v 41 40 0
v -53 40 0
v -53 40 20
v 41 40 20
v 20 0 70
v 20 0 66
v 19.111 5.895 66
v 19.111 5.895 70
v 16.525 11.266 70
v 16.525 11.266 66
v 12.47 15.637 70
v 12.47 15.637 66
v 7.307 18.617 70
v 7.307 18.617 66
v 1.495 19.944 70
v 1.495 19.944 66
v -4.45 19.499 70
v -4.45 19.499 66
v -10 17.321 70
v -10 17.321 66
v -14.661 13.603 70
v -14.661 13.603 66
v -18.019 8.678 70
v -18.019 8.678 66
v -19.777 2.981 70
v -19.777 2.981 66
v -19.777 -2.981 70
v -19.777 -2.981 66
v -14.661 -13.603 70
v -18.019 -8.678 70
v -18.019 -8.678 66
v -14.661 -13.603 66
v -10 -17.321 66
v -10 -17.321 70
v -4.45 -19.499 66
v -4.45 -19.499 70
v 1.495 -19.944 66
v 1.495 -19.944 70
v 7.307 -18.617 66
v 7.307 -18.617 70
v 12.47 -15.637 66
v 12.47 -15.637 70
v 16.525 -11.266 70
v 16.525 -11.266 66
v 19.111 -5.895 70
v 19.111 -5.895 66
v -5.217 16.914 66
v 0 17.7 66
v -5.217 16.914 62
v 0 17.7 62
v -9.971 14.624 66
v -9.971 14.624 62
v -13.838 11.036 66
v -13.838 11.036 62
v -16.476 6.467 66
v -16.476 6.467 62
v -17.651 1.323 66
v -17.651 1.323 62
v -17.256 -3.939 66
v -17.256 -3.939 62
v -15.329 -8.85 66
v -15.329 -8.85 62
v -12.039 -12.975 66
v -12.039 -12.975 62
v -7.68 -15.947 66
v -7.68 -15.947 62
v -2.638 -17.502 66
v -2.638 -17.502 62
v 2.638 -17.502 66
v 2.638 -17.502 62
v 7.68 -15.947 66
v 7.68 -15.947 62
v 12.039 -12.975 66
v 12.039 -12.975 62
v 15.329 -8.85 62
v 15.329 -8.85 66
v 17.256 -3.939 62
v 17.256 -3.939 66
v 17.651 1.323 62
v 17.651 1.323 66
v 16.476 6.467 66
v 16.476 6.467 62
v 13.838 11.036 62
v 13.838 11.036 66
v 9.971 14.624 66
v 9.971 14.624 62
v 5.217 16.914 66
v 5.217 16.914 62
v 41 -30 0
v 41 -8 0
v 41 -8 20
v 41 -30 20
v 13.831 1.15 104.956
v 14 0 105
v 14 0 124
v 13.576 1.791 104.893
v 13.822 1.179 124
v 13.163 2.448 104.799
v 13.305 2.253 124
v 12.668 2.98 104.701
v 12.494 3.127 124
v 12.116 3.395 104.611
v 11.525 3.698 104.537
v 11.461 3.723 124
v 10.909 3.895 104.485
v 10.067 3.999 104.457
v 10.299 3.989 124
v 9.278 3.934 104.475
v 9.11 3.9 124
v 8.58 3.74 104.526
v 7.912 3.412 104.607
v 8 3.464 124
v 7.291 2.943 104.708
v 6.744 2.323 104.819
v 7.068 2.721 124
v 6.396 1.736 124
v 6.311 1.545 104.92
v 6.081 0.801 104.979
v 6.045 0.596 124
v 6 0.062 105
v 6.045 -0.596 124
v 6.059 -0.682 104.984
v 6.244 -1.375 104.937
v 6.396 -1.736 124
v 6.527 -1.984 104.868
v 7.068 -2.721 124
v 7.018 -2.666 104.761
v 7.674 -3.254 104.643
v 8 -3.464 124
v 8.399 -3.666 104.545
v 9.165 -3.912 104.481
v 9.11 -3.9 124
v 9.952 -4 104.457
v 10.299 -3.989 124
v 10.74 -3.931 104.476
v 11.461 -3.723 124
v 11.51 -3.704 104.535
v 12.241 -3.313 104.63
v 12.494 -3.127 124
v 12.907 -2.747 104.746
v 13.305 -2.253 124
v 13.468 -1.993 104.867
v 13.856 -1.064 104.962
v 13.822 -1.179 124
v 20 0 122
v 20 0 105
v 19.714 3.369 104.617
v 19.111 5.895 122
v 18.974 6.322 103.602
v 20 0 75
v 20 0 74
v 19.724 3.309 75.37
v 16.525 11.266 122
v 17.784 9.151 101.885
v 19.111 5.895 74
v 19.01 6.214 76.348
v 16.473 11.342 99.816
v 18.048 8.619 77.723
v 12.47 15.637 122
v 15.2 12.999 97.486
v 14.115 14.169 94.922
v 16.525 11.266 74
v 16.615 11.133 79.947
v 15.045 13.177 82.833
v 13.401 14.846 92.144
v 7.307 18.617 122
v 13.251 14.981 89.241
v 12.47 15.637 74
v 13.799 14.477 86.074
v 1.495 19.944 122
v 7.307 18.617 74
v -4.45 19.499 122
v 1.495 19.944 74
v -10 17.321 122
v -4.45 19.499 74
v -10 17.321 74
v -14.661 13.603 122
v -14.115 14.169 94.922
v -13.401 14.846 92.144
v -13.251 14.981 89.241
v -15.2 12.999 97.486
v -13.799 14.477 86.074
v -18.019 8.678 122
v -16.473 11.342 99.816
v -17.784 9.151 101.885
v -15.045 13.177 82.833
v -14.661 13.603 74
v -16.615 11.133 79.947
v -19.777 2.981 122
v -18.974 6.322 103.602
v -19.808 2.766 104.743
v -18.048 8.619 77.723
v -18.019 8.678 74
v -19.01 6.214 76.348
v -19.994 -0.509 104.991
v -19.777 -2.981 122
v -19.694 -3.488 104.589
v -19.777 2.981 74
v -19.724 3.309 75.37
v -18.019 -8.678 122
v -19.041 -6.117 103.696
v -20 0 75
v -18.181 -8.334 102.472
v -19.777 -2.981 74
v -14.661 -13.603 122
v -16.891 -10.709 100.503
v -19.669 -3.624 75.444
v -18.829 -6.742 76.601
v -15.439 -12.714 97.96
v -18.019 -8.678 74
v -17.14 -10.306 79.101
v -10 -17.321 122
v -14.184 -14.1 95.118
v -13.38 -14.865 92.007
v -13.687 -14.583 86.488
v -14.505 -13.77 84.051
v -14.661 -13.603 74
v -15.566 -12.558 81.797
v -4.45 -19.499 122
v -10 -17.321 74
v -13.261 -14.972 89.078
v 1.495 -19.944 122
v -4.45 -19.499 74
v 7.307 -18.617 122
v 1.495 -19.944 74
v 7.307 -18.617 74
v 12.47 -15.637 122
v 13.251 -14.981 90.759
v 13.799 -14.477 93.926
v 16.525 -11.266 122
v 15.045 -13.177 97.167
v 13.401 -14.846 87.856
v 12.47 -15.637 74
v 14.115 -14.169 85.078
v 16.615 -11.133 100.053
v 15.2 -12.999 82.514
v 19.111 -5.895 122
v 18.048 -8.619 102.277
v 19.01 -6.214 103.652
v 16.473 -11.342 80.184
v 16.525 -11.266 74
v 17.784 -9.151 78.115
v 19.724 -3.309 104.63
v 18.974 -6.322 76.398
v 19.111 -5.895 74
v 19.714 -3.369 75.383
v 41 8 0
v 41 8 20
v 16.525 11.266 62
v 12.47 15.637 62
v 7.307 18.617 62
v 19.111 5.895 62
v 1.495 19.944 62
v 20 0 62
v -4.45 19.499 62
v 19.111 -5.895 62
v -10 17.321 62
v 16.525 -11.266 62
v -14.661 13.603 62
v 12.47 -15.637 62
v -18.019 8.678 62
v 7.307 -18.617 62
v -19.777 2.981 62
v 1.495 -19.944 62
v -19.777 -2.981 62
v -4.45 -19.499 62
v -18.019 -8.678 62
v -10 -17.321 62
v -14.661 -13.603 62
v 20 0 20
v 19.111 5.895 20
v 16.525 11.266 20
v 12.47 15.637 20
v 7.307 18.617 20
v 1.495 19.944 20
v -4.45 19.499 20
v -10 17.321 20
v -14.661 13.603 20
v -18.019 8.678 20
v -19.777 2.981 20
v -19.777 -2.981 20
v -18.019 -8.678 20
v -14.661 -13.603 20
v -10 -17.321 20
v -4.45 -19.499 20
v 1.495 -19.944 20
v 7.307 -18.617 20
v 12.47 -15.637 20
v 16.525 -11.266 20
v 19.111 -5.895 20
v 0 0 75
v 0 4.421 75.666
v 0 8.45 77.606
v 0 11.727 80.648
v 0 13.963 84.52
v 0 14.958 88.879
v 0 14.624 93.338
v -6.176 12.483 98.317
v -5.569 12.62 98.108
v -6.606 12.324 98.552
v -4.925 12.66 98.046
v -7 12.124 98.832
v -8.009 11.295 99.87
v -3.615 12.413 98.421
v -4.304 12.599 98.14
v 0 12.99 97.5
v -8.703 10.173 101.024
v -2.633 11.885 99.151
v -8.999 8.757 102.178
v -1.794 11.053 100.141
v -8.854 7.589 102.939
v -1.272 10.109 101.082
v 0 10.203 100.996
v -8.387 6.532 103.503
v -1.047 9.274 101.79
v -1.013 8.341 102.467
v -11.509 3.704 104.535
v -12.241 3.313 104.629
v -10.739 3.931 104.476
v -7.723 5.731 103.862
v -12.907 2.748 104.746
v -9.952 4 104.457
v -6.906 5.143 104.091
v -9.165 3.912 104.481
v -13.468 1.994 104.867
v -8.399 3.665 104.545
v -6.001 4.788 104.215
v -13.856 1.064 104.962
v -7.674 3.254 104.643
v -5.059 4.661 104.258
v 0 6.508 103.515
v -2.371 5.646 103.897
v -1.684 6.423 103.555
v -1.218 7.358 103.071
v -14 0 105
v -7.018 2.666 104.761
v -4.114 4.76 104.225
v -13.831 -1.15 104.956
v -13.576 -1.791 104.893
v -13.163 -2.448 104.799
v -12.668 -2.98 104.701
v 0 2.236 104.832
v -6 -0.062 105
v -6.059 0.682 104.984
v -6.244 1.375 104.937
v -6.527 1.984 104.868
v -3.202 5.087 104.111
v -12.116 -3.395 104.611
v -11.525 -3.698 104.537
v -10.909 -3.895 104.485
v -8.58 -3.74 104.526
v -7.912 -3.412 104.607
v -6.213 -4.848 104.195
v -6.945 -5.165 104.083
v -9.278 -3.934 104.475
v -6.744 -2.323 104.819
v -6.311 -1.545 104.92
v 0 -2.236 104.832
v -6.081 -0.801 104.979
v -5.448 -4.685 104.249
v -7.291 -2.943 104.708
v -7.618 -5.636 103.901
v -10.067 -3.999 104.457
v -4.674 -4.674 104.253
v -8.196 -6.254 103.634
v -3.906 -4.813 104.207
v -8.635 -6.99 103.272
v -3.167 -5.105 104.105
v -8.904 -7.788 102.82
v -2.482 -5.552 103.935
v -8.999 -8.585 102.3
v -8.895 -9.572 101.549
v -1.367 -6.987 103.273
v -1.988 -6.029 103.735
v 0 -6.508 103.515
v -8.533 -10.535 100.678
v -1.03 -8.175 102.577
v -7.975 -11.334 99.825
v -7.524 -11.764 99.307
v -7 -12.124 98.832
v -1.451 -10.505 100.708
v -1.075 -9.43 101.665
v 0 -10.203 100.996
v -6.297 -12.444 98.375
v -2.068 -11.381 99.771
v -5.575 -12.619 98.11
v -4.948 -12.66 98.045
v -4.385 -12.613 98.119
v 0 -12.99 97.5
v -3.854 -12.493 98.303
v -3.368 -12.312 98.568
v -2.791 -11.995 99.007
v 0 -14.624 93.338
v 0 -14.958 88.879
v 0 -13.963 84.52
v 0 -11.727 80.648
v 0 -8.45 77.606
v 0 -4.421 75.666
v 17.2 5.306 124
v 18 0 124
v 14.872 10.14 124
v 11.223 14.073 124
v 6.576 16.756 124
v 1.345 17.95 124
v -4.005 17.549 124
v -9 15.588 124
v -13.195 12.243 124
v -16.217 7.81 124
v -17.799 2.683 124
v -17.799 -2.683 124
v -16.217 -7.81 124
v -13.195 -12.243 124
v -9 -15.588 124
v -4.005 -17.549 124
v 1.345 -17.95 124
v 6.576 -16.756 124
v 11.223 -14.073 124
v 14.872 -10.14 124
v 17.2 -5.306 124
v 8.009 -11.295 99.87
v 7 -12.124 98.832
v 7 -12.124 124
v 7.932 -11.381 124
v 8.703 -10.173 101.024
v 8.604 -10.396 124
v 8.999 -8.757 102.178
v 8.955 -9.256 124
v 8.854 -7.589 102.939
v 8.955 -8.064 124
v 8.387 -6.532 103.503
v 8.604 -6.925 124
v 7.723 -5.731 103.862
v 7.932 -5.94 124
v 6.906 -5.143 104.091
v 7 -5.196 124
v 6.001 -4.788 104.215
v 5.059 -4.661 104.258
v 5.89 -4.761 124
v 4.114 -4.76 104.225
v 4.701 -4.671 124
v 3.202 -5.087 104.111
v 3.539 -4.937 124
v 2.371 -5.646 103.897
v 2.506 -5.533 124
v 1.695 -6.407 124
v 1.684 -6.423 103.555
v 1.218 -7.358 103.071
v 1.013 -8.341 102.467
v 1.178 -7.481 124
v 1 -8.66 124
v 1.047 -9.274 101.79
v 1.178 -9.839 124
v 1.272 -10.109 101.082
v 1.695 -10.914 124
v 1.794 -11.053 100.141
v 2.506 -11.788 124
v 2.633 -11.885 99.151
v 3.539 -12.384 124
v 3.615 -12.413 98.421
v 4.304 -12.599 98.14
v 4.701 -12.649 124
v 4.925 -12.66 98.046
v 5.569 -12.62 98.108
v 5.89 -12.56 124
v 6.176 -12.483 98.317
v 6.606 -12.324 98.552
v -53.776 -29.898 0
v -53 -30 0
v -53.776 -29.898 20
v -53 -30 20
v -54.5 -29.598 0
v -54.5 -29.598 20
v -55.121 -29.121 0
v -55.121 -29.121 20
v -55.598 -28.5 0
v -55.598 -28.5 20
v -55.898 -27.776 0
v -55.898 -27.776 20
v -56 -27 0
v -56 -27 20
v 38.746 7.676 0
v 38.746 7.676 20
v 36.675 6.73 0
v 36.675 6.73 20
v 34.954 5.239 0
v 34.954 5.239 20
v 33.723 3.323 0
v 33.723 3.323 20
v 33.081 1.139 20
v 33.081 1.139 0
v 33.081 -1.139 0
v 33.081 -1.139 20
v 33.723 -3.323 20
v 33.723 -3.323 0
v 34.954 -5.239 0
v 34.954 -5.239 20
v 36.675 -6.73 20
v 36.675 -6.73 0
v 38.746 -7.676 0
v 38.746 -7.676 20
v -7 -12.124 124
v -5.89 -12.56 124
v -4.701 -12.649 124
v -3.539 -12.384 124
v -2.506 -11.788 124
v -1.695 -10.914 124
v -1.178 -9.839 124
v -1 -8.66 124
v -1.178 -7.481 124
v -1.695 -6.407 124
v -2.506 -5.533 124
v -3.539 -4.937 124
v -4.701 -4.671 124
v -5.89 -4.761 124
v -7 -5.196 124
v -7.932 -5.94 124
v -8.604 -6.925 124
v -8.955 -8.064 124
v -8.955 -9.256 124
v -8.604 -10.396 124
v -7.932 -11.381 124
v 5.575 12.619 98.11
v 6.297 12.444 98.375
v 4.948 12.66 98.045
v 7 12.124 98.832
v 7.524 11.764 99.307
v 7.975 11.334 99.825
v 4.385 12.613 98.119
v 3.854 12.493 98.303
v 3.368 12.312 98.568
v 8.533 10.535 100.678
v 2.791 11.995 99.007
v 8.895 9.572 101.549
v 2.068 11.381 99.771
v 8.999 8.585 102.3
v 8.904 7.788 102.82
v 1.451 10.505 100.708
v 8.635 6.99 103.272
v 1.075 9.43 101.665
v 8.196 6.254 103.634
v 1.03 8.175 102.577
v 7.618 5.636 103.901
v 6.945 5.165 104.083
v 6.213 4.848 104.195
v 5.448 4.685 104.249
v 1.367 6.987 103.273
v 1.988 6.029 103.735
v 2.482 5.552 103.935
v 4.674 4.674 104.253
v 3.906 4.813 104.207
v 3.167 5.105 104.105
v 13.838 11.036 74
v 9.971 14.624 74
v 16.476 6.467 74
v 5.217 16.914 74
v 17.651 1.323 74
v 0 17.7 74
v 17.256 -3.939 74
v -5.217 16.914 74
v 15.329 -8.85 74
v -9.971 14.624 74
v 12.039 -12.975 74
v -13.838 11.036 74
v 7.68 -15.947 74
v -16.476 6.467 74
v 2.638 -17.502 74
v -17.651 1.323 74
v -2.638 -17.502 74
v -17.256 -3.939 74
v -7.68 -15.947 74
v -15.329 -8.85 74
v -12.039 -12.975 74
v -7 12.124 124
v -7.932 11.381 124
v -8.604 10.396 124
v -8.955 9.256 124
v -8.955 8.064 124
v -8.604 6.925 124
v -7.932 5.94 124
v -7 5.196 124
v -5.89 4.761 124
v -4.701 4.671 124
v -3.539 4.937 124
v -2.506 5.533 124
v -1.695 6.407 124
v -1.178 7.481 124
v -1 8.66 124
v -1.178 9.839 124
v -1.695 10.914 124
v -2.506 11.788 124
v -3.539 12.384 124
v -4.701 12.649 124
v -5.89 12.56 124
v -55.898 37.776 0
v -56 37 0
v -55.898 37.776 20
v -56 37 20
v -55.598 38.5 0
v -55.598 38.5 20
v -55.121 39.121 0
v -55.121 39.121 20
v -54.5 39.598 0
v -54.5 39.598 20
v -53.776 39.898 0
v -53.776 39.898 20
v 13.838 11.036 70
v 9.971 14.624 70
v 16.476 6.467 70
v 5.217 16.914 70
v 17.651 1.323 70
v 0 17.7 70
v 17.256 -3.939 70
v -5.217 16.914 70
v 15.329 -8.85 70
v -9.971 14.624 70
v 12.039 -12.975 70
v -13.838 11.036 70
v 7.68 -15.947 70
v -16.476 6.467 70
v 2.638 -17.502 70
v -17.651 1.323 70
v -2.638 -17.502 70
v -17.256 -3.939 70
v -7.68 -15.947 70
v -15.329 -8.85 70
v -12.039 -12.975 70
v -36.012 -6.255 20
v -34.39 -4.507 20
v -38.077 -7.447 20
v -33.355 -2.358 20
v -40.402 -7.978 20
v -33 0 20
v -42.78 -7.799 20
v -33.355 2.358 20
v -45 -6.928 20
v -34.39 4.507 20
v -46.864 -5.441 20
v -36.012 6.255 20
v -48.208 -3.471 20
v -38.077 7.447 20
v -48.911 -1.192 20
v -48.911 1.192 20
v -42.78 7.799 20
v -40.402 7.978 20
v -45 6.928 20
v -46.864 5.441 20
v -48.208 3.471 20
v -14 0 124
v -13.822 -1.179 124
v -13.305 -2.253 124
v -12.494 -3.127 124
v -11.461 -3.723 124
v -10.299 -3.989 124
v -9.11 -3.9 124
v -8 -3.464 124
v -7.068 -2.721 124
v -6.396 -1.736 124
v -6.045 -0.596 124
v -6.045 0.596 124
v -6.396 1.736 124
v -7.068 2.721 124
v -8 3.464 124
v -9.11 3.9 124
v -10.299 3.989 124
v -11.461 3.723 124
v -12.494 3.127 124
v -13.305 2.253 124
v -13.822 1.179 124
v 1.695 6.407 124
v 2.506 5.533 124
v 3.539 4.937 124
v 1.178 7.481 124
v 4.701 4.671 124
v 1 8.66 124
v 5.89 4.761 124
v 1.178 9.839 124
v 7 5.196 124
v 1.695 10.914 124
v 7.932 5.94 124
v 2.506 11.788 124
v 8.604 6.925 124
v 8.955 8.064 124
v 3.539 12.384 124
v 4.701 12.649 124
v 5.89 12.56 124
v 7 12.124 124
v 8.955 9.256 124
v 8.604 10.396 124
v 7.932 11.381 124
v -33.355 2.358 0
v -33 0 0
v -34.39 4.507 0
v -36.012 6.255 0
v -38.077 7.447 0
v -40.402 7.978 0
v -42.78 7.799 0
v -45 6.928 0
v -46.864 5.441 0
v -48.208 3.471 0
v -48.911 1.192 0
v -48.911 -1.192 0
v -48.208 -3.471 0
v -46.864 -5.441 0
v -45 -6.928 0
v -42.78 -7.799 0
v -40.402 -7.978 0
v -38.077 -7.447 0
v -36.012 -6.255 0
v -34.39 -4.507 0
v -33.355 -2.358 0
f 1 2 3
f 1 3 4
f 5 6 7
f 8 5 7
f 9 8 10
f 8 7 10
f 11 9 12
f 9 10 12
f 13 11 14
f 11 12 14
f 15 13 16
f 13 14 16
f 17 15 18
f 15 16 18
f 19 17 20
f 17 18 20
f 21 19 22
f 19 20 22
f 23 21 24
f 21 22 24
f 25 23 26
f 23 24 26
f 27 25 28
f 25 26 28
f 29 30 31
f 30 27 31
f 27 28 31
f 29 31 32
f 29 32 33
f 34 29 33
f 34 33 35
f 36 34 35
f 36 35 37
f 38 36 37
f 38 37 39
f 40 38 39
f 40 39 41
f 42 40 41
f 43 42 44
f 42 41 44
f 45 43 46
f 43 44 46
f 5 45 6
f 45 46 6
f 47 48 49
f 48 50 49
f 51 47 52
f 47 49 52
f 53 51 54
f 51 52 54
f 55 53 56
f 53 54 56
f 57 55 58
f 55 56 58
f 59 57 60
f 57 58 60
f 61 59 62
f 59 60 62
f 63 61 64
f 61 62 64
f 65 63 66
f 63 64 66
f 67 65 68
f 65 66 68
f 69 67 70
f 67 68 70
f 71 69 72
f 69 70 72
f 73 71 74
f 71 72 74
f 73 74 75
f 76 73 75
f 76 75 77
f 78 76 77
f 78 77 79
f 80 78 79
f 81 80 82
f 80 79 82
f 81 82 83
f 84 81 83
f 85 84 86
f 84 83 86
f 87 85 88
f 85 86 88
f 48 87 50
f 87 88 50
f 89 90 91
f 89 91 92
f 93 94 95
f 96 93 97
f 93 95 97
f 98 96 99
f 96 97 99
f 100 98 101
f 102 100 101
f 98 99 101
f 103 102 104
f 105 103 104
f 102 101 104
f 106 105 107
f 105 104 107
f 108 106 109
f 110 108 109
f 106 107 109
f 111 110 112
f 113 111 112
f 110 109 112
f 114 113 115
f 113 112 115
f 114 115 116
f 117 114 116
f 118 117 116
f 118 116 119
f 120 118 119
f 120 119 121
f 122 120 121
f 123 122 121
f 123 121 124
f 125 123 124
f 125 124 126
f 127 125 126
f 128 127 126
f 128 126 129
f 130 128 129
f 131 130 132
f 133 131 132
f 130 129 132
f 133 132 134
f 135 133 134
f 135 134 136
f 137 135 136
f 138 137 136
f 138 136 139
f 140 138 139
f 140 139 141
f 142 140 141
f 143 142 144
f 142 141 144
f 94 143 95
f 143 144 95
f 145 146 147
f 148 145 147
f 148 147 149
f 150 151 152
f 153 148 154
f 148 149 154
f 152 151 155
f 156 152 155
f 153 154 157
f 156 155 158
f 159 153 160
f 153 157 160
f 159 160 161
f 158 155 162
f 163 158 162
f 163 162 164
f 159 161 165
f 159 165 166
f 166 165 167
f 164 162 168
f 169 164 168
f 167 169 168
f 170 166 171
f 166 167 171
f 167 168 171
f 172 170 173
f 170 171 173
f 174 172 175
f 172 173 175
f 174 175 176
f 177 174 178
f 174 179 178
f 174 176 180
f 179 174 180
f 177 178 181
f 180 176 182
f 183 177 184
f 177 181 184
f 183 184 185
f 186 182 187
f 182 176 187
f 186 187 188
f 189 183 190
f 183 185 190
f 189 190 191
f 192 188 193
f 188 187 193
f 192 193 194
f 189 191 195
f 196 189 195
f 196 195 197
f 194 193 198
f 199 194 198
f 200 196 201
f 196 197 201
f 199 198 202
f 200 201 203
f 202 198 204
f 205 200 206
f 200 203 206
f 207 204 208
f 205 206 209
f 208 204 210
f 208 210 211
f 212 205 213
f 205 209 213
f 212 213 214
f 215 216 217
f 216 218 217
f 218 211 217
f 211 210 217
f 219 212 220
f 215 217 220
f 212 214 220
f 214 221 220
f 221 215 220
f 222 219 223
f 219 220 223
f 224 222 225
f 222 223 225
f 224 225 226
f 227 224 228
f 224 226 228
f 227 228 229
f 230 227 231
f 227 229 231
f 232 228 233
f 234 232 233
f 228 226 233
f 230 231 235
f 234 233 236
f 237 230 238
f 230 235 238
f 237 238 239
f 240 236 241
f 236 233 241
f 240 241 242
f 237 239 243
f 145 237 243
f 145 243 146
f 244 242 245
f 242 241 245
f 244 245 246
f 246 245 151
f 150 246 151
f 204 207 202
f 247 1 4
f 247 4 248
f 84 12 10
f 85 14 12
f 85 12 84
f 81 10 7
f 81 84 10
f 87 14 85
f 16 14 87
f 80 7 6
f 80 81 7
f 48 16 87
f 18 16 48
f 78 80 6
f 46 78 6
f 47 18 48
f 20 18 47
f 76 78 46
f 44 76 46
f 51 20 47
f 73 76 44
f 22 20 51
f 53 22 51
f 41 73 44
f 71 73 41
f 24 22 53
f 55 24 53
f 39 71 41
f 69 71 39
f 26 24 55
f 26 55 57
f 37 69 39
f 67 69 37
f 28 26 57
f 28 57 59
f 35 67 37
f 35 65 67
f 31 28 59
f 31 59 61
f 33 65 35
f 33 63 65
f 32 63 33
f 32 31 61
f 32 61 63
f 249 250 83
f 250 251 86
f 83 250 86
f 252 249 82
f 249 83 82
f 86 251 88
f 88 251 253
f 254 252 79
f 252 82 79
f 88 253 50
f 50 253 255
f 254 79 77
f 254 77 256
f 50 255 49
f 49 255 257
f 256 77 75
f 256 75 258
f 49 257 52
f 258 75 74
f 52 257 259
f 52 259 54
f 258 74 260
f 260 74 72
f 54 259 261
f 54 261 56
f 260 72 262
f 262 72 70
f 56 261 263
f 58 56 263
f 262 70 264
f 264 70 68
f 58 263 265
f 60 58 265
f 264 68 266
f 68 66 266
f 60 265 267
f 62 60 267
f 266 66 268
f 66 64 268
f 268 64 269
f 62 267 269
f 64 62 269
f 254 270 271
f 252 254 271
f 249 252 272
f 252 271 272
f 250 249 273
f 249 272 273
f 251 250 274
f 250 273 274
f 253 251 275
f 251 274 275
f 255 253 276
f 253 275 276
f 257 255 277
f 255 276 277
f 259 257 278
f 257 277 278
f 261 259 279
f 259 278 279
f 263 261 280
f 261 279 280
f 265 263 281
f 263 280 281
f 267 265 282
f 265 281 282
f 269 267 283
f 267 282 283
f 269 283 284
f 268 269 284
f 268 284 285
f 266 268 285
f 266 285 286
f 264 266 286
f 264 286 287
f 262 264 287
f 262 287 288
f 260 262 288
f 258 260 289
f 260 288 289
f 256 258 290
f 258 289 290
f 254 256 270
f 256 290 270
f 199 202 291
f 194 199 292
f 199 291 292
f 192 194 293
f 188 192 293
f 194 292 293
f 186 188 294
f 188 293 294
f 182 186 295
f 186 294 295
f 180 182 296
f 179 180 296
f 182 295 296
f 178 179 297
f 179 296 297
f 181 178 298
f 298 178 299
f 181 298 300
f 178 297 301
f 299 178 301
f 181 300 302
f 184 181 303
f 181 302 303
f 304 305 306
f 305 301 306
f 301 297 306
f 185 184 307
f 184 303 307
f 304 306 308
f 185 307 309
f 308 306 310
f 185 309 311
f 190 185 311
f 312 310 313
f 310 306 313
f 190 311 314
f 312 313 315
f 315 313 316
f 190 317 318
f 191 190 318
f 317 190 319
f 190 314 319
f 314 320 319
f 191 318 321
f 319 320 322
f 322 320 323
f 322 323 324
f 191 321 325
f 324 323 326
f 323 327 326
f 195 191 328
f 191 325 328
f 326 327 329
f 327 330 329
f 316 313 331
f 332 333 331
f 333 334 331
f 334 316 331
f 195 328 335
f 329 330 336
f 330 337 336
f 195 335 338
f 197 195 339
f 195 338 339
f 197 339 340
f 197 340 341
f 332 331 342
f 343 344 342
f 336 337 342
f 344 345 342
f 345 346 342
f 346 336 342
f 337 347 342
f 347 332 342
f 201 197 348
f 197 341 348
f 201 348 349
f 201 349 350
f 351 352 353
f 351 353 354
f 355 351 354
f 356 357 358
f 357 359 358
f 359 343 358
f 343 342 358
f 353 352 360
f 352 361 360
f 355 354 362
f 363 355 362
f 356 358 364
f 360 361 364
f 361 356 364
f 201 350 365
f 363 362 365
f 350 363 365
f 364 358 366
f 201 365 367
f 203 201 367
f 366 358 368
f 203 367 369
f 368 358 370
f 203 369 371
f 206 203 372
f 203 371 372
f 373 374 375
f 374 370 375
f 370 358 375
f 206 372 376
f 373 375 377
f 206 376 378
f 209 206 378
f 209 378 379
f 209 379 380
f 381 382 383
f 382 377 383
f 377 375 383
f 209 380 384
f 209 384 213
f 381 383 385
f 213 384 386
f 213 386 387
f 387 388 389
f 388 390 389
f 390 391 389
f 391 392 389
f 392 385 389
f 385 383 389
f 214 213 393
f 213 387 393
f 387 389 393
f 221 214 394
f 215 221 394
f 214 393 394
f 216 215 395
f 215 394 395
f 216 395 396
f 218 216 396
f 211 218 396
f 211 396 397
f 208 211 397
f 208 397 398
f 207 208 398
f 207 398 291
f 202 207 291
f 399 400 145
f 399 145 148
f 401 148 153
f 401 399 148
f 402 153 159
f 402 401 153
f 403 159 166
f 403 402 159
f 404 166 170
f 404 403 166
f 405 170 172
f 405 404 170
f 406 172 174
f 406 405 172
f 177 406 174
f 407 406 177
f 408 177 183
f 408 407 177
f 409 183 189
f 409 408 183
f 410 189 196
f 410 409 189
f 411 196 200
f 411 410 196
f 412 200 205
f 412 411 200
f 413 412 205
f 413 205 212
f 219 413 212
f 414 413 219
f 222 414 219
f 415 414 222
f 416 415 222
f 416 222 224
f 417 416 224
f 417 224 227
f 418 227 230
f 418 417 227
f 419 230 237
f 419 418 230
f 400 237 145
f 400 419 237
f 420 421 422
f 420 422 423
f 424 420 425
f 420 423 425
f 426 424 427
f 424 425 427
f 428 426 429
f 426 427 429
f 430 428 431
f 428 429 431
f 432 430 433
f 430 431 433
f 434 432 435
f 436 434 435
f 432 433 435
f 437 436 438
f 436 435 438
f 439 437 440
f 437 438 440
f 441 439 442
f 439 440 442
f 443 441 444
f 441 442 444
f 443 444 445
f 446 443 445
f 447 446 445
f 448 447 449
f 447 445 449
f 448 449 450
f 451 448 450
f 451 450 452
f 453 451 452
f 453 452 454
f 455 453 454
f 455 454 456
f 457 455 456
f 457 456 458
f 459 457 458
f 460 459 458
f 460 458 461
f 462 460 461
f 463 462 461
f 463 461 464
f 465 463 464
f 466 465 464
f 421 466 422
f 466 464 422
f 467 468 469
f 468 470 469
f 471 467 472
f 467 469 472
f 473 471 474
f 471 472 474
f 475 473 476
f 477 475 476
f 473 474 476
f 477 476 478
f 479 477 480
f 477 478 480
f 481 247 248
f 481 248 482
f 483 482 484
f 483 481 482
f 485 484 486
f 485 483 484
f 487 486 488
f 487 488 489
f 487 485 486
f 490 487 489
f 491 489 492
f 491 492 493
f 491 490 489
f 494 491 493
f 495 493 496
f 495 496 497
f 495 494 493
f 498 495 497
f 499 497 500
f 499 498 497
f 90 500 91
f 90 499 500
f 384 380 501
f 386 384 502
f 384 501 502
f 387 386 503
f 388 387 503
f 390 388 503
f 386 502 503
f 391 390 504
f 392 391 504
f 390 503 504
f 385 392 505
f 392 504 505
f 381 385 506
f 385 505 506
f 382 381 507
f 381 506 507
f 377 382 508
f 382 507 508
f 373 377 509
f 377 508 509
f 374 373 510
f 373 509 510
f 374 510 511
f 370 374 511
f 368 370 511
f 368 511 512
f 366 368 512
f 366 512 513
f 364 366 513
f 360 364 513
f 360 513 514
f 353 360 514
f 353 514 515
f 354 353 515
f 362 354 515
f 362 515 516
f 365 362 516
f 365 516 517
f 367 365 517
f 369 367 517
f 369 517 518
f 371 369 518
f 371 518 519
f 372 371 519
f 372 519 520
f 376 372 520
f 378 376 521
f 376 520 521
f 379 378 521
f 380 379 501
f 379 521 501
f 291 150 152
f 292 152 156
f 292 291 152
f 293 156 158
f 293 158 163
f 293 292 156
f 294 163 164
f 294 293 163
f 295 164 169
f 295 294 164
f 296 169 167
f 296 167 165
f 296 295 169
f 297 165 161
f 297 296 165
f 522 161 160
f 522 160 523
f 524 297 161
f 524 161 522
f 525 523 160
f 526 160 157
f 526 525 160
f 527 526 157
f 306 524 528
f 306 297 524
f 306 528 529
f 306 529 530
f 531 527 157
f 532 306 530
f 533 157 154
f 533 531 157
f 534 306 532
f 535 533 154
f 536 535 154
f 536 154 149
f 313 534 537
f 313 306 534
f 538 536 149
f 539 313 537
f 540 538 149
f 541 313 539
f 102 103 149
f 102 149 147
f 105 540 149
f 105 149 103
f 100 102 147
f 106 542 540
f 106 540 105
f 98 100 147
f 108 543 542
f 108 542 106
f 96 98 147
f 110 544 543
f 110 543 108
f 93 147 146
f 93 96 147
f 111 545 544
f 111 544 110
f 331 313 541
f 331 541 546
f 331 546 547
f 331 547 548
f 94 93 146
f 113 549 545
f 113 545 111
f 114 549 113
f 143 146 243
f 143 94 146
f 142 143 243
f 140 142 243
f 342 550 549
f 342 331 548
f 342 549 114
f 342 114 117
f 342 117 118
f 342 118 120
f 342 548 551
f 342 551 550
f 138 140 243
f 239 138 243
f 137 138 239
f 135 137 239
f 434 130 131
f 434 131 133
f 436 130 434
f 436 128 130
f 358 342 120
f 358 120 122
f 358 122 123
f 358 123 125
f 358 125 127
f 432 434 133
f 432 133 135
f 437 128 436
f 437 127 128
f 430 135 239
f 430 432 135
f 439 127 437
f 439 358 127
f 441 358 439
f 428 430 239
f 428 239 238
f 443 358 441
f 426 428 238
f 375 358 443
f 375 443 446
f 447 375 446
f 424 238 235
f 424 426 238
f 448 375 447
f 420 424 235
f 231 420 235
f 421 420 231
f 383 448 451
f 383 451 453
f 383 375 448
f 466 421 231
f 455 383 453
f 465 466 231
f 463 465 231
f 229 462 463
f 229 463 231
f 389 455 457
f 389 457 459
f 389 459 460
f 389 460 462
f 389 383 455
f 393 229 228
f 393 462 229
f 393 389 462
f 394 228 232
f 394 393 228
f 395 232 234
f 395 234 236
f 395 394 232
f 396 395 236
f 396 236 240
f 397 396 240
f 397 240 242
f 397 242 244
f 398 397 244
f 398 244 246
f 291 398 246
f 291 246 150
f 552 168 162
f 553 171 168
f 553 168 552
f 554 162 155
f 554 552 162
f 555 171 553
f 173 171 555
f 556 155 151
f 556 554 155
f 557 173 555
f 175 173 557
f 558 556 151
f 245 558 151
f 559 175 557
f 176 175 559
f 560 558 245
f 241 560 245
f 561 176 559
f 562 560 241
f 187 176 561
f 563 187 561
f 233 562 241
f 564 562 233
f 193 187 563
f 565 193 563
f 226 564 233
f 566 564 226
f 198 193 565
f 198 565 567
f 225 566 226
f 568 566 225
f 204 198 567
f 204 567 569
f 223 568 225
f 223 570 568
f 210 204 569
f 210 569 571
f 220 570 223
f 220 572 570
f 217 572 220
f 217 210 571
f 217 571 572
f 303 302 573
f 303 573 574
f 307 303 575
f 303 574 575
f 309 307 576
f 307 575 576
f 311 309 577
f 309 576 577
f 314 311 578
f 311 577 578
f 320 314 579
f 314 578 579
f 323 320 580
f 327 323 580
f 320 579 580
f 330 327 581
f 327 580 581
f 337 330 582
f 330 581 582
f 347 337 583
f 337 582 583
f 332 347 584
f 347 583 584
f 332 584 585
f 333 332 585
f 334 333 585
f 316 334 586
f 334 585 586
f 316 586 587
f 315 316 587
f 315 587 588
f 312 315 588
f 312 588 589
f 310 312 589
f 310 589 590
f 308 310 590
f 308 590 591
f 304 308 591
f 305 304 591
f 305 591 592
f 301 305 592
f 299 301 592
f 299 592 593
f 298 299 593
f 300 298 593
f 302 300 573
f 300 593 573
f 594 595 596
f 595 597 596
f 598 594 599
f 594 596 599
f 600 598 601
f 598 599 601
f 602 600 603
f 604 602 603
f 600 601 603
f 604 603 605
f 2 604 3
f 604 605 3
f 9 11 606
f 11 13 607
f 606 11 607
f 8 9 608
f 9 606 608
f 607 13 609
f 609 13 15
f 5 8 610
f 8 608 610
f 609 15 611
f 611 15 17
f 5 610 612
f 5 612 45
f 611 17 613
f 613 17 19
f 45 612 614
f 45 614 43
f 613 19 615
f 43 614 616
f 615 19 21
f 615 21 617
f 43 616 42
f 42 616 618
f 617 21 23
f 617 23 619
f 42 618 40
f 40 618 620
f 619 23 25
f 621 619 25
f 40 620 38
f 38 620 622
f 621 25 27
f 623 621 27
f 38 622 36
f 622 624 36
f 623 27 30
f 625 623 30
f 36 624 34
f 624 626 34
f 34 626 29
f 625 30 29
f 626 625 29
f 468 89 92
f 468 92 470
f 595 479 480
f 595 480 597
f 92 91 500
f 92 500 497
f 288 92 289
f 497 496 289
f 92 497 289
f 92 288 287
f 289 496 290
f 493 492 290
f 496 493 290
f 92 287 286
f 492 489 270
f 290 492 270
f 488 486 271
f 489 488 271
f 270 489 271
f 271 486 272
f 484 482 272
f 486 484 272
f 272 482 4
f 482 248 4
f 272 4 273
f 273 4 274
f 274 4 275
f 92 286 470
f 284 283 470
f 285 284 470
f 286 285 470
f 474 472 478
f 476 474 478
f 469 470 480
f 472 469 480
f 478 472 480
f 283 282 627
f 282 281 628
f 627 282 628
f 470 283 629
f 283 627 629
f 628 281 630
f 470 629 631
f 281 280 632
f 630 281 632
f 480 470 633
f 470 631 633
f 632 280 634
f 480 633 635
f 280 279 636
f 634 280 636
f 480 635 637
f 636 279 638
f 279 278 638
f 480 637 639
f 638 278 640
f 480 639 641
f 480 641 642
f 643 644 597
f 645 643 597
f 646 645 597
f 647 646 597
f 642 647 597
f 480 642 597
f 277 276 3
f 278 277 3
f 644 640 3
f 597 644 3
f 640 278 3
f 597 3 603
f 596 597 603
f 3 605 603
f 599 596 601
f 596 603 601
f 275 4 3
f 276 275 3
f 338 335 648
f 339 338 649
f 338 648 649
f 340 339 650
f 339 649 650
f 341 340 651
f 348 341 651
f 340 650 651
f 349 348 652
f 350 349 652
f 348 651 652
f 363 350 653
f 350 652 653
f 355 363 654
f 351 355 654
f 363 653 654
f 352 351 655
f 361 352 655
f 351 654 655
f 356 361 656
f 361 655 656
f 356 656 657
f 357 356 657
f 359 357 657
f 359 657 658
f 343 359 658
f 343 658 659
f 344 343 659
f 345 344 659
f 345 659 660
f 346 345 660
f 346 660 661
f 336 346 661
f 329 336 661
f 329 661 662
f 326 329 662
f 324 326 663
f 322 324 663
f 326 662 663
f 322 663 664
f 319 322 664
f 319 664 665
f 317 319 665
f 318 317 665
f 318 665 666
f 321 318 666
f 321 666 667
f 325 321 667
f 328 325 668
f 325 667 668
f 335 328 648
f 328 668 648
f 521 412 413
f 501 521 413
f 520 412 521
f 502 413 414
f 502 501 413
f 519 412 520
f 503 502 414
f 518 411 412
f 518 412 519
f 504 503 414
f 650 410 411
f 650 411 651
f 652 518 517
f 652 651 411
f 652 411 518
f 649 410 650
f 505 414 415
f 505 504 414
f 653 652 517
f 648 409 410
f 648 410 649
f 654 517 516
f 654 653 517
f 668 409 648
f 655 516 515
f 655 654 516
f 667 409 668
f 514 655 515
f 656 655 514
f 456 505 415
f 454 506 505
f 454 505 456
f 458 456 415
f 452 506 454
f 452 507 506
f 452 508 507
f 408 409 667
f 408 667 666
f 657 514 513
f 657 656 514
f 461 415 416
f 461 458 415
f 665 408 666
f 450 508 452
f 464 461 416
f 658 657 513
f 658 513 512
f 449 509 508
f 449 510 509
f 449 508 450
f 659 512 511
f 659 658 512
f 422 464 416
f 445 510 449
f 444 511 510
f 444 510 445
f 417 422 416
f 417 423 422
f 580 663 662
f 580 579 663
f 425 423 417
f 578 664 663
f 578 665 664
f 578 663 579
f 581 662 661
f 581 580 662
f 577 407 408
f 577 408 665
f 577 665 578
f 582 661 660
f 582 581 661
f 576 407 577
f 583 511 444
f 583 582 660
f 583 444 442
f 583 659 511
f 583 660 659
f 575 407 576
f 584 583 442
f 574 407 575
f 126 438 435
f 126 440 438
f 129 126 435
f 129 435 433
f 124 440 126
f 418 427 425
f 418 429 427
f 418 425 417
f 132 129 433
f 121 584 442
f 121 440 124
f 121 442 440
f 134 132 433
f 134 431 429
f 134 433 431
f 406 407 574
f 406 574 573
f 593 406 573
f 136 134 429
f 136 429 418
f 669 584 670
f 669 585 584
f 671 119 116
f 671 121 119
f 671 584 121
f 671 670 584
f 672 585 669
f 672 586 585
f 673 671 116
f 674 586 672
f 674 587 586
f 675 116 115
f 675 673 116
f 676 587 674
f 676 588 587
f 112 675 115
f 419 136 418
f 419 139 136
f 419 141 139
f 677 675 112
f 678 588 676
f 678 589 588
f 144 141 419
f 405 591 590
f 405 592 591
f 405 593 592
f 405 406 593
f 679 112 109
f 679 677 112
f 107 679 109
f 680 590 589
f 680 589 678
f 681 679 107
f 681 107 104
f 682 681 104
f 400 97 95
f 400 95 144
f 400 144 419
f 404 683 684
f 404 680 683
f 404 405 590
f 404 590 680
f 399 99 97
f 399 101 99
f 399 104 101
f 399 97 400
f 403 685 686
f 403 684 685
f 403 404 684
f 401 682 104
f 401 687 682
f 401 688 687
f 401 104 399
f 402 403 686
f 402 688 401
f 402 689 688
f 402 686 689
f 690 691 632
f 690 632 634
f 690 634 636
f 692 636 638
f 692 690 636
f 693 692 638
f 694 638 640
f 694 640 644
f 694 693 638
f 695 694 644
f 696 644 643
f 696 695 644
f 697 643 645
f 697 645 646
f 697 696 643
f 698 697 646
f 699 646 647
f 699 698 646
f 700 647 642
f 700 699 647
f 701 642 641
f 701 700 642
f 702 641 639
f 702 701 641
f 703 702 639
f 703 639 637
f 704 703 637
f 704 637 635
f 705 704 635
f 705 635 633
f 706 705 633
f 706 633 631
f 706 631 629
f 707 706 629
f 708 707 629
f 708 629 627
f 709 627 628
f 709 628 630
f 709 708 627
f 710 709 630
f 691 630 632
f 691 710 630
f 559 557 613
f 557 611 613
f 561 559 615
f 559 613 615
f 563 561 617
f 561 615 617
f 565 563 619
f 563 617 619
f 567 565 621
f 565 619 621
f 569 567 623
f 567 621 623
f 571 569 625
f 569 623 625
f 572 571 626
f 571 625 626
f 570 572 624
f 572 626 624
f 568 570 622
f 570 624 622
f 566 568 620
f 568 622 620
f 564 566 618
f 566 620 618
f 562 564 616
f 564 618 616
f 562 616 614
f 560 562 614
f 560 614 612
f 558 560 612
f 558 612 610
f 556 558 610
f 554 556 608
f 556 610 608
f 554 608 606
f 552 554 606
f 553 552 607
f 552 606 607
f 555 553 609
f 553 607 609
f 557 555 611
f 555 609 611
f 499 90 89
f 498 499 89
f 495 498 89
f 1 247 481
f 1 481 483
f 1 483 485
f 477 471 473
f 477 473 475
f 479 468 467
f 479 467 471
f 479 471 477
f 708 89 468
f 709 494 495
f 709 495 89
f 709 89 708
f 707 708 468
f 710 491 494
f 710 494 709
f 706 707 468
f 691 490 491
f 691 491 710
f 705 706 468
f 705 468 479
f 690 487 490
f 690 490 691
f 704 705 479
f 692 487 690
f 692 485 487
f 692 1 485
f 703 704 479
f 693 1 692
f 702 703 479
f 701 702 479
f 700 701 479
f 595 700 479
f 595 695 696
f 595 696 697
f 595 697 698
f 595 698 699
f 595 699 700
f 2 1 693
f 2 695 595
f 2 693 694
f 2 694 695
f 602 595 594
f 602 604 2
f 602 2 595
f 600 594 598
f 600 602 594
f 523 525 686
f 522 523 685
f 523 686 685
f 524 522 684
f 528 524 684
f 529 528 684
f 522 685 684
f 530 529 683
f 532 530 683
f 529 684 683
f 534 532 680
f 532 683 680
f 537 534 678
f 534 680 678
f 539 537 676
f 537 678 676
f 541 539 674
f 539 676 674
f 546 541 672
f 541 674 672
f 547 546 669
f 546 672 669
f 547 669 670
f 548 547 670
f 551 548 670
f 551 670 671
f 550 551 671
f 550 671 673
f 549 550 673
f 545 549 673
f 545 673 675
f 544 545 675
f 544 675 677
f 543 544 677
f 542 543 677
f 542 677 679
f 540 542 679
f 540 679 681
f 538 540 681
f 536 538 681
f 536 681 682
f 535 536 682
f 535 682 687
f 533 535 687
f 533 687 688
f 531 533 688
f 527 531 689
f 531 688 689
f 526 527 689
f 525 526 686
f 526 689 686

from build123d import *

# Parameters (mm, degrees)
SKETCH1_R               = 8
BOSS_EXTRUDE1_DEPTH     = 20
SKETCH2_R               = 20
BOSS_EXTRUDE2_DEPTH     = 104
SKETCH3_R               = 15
CUT_EXTRUDE1_DEPTH      = 42
CUT_EXTRUDE1_DEPTH_BACK = 57
SKETCH4_W               = 4
SKETCH4_H               = 2.3
SKETCH5_R               = 4
CUT_EXTRUDE2_DEPTH      = 30
CIRPATTERN1_COUNT       = 6
FILLET1_R               = 3
CHAMFER1_SIZE           = 2


with BuildPart() as part:
    # Sketch1 → Boss-Extrude1 (new body)
    with BuildSketch(Plane.XY):
        with BuildLine():
            Line((41, -8), (41, -30))
            Line((41, -30), (-56, -30))
            Line((-56, -30), (-56, 40))
            Line((-56, 40), (41, 40))
            Line((41, 40), (41, 8))
            ThreePointArc((41, 8), (33, 0), (41, -8))
        make_face()
        with Locations((-41, 0)):
            Circle(SKETCH1_R, mode=Mode.SUBTRACT)
    extrude(amount=BOSS_EXTRUDE1_DEPTH)

    # Sketch2 → Boss-Extrude2 (add)
    with BuildSketch(Plane.XY.offset(20)):
        Circle(SKETCH2_R)
    extrude(amount=BOSS_EXTRUDE2_DEPTH)

    # Sketch3 → Cut-Extrude1 (cut, two sides)
    with BuildSketch(Plane(origin=(0, 0, 0), x_dir=(0, 0, -1), z_dir=(1, 0, 0))) as cut_extrude1_sk:
        with Locations((-90, 0)):
            Circle(SKETCH3_R)
    extrude(amount=CUT_EXTRUDE1_DEPTH, mode=Mode.SUBTRACT)
    extrude(cut_extrude1_sk.sketch, amount=-CUT_EXTRUDE1_DEPTH_BACK, mode=Mode.SUBTRACT)

    # Sketch4 → Cut-Revolve1 (revolve, cut)
    with BuildSketch(Plane(origin=(0, 0, 0), x_dir=(0, 0, -1), z_dir=(1, 0, 0))):
        with Locations((-72, 18.85)):
            Rectangle(SKETCH4_W, SKETCH4_H)
        with Locations((-64, 18.85)):
            Rectangle(SKETCH4_W, SKETCH4_H)
    revolve(axis=Axis((0, 0, 0), (0, 0, 1)), mode=Mode.SUBTRACT)

    # Sketch5 → Cut-Extrude2 (cut)
    with BuildSketch(Plane.XY.offset(124)):
        with Locations((10, 0)):
            Circle(SKETCH5_R)
    cut_extrude2 = extrude(amount=-CUT_EXTRUDE2_DEPTH, mode=Mode.SUBTRACT)

    # CirPattern1: Cut-Extrude2 ×6 about axis
    cirpattern1_axis = Axis((0, 0, 0), (0, 0, 1))
    for i in range(1, CIRPATTERN1_COUNT):
        add(cut_extrude2.rotate(cirpattern1_axis, i * 360 / CIRPATTERN1_COUNT), mode=Mode.SUBTRACT)

    # Fillet1
    fillet1_edges = [part.edges().sort_by_distance(p)[0] for p in [
        (-56, -30, 10),
        (-56, 40, 10),
    ]]
    fillet(fillet1_edges, radius=FILLET1_R)

    # Chamfer1
    chamfer1_edges = [part.edges().sort_by_distance(p)[0] for p in [
        (-20, 0, 124),
    ]]
    chamfer(chamfer1_edges, length=CHAMFER1_SIZE)


solid = part.part
